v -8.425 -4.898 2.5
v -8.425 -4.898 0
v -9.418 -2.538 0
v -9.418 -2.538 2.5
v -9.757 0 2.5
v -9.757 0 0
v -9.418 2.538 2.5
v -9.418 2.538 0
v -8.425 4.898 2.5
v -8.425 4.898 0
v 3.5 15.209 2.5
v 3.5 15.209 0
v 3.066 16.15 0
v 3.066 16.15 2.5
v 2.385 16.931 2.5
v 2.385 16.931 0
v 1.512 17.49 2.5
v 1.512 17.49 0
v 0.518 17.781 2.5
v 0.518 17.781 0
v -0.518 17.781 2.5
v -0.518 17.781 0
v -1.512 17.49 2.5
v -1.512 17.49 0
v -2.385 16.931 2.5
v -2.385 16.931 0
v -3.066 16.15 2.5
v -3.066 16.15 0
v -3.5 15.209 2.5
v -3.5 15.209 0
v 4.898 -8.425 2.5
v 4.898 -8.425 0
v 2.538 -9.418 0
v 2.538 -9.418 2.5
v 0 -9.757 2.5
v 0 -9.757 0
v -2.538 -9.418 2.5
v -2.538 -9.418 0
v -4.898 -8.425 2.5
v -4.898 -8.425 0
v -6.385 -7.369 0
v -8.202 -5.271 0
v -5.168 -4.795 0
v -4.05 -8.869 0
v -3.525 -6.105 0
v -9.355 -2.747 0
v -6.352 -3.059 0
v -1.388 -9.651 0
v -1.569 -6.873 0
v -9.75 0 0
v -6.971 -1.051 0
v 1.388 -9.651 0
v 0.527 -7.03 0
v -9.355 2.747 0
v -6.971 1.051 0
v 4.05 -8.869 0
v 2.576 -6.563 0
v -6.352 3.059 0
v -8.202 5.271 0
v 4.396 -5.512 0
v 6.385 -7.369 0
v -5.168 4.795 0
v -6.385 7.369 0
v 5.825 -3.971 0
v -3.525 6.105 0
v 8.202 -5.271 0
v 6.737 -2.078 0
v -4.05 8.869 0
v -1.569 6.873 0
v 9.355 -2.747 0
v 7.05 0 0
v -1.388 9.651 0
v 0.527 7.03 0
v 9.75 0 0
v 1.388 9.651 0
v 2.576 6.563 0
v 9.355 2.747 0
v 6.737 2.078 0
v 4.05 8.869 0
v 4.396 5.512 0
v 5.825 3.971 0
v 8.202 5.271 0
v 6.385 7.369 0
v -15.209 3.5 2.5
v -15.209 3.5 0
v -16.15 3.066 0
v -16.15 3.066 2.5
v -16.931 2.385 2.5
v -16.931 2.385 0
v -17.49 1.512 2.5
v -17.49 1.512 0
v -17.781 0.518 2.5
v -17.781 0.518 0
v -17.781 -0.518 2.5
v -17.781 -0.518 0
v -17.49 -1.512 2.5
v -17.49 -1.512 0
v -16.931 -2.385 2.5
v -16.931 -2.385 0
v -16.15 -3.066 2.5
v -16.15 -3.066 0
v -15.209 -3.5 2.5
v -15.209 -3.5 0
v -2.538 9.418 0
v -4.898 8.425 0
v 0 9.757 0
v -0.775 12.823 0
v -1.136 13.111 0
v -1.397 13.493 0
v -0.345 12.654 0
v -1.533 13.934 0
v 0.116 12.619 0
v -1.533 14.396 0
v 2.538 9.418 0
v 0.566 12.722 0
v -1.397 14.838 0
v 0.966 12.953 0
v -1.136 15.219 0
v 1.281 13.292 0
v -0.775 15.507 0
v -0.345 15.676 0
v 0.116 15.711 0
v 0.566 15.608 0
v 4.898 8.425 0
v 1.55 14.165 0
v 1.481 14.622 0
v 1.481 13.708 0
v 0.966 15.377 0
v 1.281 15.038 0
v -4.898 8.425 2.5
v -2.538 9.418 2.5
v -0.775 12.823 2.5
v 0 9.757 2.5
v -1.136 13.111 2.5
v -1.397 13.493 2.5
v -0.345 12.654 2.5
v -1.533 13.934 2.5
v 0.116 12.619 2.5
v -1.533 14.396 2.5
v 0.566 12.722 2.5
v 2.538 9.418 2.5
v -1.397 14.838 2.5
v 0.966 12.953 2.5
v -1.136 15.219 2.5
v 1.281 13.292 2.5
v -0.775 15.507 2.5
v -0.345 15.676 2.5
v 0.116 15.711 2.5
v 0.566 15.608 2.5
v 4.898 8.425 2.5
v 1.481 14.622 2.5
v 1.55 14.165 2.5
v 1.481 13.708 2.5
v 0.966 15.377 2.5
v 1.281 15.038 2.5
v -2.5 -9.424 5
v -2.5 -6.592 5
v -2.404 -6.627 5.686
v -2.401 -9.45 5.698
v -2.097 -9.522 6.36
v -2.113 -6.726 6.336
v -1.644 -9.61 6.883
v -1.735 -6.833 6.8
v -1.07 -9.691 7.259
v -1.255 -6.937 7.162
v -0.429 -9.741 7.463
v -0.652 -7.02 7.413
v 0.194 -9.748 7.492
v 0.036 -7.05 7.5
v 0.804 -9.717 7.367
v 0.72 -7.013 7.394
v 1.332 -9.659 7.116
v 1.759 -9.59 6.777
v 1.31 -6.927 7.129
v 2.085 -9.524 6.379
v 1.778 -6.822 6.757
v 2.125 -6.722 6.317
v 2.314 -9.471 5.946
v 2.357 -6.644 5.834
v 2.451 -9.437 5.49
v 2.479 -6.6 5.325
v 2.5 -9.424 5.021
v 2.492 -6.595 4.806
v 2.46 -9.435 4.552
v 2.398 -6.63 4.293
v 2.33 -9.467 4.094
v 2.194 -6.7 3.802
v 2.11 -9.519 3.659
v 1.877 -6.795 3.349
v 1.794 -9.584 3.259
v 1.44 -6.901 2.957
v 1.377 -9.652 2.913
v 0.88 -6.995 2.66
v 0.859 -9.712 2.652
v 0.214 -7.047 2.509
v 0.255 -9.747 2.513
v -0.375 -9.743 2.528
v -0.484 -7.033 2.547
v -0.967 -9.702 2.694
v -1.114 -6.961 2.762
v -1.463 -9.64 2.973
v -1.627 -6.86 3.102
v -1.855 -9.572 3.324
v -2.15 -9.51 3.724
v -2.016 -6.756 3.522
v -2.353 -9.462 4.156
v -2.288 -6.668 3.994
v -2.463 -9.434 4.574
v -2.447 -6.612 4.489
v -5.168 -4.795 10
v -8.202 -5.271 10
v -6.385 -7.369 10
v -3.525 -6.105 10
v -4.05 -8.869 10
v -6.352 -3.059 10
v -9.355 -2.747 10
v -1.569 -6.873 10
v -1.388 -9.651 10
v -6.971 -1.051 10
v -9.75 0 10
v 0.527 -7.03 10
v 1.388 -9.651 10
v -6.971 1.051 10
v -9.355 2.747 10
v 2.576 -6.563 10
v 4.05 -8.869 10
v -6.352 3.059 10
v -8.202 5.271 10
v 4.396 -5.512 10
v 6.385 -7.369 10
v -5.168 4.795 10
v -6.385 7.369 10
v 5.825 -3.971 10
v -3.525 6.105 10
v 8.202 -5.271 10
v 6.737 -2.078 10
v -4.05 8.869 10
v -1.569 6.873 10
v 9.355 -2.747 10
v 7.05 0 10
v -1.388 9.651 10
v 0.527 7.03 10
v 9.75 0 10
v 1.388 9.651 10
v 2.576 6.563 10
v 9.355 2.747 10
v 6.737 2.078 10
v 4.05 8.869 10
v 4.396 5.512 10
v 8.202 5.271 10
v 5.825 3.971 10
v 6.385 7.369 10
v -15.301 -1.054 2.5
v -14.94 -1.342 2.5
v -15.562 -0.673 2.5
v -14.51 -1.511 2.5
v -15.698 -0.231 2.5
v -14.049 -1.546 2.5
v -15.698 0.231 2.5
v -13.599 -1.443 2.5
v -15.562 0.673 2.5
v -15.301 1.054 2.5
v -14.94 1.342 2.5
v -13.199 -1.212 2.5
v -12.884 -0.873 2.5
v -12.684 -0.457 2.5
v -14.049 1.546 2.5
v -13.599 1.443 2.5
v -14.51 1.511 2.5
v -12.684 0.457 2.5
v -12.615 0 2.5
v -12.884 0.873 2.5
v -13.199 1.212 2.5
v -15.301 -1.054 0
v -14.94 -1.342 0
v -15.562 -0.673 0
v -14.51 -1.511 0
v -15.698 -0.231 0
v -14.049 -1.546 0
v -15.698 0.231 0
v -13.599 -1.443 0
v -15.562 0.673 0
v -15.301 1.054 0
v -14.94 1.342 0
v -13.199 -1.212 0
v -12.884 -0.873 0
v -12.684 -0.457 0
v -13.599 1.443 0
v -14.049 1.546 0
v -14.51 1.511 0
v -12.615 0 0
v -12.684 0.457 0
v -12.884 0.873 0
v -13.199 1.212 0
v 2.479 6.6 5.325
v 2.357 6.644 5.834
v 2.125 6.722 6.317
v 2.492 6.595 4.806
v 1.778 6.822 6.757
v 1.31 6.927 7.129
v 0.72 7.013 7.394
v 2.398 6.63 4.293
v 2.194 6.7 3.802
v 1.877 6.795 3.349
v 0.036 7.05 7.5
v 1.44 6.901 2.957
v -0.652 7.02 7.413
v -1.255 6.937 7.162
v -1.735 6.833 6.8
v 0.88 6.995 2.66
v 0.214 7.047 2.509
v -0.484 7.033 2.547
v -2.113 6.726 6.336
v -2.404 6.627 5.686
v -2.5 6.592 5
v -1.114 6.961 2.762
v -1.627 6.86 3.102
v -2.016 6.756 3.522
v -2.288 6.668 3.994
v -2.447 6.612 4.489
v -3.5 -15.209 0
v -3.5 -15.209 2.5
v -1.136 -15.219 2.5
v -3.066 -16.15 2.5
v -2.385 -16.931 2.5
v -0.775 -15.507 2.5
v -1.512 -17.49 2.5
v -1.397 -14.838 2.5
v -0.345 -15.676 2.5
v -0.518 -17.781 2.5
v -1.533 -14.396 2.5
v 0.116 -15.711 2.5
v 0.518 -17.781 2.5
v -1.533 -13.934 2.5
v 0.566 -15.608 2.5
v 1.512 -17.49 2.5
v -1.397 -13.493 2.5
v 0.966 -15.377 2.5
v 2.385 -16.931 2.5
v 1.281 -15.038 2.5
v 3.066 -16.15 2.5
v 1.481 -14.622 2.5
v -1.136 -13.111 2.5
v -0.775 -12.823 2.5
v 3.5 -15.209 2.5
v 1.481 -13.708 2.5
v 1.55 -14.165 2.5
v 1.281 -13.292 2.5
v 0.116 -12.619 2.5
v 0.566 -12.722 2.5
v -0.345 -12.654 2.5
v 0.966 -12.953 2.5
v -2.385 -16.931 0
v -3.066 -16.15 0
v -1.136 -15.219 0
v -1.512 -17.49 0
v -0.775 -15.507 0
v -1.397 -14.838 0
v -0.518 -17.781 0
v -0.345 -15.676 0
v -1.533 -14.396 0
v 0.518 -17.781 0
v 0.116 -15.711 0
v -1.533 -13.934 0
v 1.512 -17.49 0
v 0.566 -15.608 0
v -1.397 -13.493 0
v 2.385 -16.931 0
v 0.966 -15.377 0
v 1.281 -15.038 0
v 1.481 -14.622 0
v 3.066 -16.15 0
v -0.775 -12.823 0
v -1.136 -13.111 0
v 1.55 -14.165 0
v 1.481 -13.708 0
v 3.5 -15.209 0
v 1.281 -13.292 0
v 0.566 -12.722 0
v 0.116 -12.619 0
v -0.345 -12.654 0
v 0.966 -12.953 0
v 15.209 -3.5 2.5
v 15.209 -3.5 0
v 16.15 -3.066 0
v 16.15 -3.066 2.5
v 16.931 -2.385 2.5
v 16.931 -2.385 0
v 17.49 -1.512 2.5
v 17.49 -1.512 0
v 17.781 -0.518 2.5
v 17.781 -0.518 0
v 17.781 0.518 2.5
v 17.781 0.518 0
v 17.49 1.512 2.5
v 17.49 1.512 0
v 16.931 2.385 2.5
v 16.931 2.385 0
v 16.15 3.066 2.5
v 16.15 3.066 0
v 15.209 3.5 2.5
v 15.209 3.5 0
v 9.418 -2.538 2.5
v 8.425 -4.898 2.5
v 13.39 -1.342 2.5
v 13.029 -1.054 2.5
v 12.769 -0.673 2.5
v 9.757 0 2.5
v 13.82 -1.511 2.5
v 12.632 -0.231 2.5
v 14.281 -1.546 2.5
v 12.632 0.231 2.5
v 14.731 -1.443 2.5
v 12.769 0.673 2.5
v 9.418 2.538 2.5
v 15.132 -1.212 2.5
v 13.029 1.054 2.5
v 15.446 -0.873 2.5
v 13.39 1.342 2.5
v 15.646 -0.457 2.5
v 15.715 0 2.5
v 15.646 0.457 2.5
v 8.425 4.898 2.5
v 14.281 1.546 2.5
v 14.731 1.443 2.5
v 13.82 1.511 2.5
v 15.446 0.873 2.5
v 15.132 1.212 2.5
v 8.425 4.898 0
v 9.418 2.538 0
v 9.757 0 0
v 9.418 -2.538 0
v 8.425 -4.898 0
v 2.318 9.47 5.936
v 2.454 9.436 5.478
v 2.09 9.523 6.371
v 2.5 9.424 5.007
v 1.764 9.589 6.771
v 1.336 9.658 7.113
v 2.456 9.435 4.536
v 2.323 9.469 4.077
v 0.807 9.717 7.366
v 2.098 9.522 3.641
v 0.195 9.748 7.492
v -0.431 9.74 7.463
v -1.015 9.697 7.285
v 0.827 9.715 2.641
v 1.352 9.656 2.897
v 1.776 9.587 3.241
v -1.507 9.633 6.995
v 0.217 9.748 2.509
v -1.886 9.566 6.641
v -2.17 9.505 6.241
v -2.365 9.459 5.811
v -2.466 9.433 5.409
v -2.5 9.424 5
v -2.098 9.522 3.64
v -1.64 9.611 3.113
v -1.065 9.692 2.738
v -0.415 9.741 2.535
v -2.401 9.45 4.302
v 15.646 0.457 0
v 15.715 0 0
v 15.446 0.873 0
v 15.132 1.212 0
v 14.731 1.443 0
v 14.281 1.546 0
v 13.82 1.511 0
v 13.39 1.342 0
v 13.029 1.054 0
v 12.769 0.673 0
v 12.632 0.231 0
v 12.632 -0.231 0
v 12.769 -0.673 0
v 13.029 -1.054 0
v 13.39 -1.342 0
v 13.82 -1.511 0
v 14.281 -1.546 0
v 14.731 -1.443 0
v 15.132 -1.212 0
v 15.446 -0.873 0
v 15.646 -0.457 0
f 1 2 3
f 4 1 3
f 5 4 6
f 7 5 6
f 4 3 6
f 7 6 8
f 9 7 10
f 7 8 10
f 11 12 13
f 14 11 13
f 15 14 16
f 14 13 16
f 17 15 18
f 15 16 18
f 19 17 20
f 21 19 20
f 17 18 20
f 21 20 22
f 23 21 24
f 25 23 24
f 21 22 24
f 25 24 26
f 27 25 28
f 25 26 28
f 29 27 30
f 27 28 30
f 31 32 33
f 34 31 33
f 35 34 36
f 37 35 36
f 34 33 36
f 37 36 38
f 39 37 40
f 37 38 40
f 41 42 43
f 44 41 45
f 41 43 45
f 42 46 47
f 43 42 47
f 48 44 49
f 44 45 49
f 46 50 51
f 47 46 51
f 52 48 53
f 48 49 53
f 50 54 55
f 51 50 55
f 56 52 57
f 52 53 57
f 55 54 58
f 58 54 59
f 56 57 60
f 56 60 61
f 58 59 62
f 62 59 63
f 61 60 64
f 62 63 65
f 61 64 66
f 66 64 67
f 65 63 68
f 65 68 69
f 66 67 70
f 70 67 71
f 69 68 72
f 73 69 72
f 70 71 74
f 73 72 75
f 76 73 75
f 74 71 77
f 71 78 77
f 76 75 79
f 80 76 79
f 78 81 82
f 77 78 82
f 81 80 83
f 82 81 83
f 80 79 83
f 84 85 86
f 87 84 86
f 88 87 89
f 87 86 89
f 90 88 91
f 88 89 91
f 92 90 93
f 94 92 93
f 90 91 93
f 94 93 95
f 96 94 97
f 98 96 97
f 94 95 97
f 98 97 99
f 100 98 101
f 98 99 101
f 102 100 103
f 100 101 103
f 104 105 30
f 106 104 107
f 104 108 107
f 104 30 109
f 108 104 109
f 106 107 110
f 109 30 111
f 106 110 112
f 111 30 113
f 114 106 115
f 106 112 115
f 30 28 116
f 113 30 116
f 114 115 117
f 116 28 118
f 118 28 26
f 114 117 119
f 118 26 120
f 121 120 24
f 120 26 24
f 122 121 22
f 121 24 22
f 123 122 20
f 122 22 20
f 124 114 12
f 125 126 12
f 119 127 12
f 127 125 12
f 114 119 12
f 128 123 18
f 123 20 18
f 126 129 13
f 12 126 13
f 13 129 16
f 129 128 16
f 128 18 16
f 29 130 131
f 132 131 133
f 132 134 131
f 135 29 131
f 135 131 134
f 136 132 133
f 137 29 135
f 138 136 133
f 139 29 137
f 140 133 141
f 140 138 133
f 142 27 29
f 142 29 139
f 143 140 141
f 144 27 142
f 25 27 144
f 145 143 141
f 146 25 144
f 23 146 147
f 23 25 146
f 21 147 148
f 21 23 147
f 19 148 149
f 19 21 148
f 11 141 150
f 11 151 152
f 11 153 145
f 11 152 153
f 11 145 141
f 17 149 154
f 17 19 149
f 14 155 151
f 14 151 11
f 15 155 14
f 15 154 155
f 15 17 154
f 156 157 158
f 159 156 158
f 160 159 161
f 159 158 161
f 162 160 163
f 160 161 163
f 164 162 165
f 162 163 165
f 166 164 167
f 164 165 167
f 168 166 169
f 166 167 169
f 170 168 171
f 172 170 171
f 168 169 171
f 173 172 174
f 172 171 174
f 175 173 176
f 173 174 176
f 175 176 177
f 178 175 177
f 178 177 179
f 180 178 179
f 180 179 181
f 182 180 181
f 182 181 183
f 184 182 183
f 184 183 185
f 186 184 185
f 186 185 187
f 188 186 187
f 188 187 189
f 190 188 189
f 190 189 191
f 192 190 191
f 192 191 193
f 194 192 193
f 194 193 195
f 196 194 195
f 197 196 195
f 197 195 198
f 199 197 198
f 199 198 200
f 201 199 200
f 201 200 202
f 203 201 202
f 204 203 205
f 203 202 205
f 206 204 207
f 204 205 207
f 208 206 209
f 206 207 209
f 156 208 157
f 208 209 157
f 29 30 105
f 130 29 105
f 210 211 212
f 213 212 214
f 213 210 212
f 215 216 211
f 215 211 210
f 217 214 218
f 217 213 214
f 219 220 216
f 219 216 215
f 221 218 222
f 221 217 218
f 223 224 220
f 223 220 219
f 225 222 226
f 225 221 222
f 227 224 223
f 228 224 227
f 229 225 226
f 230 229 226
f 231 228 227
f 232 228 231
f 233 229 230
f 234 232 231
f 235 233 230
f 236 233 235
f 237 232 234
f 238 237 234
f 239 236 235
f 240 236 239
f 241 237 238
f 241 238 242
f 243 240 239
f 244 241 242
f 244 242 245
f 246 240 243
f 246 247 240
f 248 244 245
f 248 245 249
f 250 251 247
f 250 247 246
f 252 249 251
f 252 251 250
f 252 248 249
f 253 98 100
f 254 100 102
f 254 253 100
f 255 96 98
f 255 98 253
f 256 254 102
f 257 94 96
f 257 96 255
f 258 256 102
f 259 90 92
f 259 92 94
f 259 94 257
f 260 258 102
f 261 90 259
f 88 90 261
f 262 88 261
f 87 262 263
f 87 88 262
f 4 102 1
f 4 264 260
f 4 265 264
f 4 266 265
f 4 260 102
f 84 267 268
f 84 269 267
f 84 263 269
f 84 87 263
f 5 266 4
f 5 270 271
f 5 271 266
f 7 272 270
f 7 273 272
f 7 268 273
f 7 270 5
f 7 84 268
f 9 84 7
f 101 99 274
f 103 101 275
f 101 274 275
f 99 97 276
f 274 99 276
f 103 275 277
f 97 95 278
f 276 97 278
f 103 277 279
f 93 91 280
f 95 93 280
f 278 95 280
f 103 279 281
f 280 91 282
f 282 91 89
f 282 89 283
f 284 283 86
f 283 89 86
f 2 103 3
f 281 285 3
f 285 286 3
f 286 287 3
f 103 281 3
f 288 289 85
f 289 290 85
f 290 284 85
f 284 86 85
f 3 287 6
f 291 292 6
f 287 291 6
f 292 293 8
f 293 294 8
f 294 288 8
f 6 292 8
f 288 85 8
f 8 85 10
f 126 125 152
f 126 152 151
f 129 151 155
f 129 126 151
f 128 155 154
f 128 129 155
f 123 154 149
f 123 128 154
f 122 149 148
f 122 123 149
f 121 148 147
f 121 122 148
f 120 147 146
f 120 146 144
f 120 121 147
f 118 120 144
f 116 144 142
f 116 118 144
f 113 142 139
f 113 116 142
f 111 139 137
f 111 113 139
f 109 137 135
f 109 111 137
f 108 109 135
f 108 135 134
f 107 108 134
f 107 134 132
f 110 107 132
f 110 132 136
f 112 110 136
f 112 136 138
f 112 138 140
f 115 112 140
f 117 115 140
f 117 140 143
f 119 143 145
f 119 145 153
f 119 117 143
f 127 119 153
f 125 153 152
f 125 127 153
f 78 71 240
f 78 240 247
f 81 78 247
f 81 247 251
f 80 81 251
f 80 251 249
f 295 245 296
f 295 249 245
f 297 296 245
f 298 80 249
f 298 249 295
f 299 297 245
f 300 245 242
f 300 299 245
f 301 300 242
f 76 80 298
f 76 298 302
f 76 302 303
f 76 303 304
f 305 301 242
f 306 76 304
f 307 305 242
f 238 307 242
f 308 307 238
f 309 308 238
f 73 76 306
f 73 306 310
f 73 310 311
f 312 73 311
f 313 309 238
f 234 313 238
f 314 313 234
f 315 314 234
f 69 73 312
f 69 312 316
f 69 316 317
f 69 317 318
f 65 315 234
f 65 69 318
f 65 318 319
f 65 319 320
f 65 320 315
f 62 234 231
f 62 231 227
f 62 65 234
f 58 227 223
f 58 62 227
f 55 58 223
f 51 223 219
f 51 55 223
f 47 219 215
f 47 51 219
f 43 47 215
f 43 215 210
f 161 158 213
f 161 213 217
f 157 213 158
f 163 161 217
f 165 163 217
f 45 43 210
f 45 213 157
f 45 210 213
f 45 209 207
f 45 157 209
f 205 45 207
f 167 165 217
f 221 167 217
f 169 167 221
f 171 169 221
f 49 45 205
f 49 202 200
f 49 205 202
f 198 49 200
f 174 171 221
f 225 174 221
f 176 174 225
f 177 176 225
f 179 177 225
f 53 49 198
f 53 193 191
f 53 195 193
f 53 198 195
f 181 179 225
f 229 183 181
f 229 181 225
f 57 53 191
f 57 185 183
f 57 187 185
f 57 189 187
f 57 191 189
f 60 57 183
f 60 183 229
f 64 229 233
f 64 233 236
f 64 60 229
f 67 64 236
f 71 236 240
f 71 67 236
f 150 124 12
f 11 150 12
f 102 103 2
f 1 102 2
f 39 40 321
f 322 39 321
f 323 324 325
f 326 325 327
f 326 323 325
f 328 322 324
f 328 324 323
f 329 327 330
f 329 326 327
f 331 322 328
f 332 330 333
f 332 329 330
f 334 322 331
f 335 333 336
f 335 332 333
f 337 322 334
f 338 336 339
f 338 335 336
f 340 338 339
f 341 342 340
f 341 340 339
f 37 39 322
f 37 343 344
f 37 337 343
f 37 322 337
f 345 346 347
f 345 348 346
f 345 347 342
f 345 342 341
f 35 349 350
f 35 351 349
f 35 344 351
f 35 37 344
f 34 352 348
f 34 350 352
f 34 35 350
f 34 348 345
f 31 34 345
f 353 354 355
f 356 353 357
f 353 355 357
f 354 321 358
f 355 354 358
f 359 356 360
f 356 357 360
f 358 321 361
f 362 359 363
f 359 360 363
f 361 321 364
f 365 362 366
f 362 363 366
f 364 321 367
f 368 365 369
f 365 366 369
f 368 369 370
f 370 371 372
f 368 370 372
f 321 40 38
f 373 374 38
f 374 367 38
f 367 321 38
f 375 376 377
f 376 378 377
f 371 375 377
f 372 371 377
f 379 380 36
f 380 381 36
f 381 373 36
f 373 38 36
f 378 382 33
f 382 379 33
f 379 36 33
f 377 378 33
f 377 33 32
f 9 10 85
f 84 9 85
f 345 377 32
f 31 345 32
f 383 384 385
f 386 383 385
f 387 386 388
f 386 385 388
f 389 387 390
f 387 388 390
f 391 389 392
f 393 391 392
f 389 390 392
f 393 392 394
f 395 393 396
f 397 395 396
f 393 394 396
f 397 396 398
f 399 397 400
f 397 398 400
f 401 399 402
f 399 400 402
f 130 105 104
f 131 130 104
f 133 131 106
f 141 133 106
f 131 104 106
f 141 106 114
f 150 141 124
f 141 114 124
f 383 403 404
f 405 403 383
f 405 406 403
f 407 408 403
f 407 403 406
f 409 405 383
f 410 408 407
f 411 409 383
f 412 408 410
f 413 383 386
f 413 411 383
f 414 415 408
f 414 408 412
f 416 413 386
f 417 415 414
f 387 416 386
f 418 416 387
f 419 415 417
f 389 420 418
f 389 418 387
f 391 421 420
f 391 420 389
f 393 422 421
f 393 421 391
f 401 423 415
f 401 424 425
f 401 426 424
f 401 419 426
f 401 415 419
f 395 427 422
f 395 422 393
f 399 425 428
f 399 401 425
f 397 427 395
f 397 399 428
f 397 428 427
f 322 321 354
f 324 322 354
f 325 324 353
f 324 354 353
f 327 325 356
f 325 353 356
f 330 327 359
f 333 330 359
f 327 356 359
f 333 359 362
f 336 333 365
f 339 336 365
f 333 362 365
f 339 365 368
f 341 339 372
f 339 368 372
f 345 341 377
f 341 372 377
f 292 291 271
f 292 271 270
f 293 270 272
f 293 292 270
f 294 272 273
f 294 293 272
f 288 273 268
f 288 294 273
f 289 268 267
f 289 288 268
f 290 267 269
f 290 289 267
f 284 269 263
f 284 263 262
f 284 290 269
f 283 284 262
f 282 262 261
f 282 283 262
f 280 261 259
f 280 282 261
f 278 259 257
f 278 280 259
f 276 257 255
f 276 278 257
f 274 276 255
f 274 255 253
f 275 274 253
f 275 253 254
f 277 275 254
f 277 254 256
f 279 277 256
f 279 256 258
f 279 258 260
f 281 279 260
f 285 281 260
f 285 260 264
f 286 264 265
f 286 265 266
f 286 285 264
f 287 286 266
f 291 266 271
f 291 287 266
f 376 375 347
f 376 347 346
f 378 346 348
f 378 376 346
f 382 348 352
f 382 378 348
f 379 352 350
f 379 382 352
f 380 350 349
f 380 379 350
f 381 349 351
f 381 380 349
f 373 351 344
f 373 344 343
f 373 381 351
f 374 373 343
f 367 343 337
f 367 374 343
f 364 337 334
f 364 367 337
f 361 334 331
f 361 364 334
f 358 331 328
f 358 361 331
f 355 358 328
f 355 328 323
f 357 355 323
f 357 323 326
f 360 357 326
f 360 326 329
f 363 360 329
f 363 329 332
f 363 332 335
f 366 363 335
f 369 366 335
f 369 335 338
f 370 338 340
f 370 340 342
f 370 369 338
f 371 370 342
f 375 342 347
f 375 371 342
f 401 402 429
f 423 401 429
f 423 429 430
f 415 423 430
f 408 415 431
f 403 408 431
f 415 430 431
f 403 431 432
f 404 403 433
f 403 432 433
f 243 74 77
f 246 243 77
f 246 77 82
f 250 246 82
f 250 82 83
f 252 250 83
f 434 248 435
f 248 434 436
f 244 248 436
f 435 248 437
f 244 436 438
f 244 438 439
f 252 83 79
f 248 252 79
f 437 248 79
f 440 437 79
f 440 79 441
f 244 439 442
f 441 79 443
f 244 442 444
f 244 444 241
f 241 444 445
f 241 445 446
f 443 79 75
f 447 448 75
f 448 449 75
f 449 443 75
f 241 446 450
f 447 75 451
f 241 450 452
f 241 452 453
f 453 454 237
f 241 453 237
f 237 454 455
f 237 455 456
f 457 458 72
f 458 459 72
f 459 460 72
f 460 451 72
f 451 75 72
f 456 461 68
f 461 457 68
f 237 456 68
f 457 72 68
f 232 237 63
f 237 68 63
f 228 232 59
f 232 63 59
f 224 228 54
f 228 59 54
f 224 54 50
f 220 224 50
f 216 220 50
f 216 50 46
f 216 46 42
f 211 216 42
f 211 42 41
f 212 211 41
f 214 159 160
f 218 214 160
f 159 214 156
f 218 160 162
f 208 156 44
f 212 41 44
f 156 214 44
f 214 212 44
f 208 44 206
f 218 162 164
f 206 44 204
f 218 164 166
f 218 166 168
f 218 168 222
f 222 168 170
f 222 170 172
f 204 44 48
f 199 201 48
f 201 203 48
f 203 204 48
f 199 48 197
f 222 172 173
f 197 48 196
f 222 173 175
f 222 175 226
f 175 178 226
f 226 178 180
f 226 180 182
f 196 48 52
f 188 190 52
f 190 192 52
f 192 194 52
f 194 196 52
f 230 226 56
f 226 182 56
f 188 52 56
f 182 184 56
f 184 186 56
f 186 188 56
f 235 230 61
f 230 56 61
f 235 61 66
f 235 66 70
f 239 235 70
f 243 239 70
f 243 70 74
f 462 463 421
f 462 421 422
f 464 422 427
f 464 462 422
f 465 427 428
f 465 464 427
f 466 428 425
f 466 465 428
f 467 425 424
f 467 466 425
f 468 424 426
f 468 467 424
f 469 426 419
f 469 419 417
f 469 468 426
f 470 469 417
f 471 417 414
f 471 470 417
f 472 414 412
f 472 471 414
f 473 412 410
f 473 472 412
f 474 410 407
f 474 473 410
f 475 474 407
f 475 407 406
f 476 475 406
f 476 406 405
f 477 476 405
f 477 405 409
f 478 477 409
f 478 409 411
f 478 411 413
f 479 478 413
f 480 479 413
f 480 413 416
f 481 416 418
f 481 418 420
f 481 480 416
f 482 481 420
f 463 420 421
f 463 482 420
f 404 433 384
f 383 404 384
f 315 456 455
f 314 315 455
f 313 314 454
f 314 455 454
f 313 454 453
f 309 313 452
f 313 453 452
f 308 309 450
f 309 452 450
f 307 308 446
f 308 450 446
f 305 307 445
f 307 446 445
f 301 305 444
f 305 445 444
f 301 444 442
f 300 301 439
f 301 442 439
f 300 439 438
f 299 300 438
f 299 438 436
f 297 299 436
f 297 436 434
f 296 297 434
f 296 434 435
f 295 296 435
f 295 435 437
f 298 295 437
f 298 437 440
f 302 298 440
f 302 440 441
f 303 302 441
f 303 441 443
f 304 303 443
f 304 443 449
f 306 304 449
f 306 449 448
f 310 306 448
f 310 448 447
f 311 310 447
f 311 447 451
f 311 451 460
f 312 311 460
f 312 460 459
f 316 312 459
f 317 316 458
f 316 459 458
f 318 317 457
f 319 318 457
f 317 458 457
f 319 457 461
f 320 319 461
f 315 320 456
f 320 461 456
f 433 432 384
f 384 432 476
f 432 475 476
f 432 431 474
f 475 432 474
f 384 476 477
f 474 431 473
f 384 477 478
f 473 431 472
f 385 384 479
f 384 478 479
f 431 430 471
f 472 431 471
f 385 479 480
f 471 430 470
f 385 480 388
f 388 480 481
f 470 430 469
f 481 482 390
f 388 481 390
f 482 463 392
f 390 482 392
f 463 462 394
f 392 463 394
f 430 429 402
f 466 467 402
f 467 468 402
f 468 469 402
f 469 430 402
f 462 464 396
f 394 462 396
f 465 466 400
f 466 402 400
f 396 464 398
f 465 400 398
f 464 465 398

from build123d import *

# Parameters (mm, degrees)
F1_R     = 1.55
F2_DEPTH = 2.5
F0_R     = 9.75
F0_R_2   = 7.05
F3_DEPTH = 10
F6_D     = 5
F6_DEPTH = 19.5


with BuildPart() as f2:
    # F1 (on Top) → F2 (new body)
    with BuildSketch(Plane.XY):
        with BuildLine():
            ThreePointArc((3.5, 15.209301), (0, 17.817577), (-3.5, 15.209301))
            Line((-3.5, 15.209301), (-4.897816, 8.425027))
            ThreePointArc((-4.897816, 8.425027), (0, 9.756637), (4.897816, 8.425027))
            Line((4.897816, 8.425027), (3.5, 15.209301))
        make_face()
        with Locations((0, 14.165145)):
            Circle(F1_R, mode=Mode.SUBTRACT)
        with BuildLine():
            Line((-8.425027, 4.897816), (-15.209301, 3.5))
            ThreePointArc((-15.209301, 3.5), (-17.817577, 0), (-15.209301, -3.5))
            Line((-15.209301, -3.5), (-8.425027, -4.897816))
            ThreePointArc((-8.425027, -4.897816), (-9.756637, 0), (-8.425027, 4.897816))
        make_face()
        with Locations((-14.165145, 0)):
            Circle(F1_R, mode=Mode.SUBTRACT)
        with BuildLine():
            Line((-4.897816, -8.425027), (-3.5, -15.209301))
            ThreePointArc((-3.5, -15.209301), (0, -17.817577), (3.5, -15.209301))
            Line((3.5, -15.209301), (4.897816, -8.425027))
            ThreePointArc((4.897816, -8.425027), (0, -9.756637), (-4.897816, -8.425027))
        make_face()
        with Locations((0, -14.165145)):
            Circle(F1_R, mode=Mode.SUBTRACT)
        with BuildLine():
            Line((8.425027, -4.897816), (15.209301, -3.5))
            ThreePointArc((15.209301, -3.5), (17.817577, 0), (15.209301, 3.5))
            Line((15.209301, 3.5), (8.425027, 4.897816))
            ThreePointArc((8.425027, 4.897816), (9.756637, 0), (8.425027, -4.897816))
        make_face()
        with Locations((14.165145, 0)):
            Circle(F1_R, mode=Mode.SUBTRACT)
    extrude(amount=F2_DEPTH)


with BuildPart() as f3:
    # F0 (on Top) → F3 (new body)
    with BuildSketch(Plane.XY):
        Circle(F0_R)
        Circle(F0_R_2, mode=Mode.SUBTRACT)
    extrude(amount=F3_DEPTH)

    # F6
    with Locations(Plane.XZ.offset(9.75)):
        with Locations((0, 5)):
            Hole(F6_D / 2, depth=F6_DEPTH)


solid = Compound([f2.part, f3.part])
